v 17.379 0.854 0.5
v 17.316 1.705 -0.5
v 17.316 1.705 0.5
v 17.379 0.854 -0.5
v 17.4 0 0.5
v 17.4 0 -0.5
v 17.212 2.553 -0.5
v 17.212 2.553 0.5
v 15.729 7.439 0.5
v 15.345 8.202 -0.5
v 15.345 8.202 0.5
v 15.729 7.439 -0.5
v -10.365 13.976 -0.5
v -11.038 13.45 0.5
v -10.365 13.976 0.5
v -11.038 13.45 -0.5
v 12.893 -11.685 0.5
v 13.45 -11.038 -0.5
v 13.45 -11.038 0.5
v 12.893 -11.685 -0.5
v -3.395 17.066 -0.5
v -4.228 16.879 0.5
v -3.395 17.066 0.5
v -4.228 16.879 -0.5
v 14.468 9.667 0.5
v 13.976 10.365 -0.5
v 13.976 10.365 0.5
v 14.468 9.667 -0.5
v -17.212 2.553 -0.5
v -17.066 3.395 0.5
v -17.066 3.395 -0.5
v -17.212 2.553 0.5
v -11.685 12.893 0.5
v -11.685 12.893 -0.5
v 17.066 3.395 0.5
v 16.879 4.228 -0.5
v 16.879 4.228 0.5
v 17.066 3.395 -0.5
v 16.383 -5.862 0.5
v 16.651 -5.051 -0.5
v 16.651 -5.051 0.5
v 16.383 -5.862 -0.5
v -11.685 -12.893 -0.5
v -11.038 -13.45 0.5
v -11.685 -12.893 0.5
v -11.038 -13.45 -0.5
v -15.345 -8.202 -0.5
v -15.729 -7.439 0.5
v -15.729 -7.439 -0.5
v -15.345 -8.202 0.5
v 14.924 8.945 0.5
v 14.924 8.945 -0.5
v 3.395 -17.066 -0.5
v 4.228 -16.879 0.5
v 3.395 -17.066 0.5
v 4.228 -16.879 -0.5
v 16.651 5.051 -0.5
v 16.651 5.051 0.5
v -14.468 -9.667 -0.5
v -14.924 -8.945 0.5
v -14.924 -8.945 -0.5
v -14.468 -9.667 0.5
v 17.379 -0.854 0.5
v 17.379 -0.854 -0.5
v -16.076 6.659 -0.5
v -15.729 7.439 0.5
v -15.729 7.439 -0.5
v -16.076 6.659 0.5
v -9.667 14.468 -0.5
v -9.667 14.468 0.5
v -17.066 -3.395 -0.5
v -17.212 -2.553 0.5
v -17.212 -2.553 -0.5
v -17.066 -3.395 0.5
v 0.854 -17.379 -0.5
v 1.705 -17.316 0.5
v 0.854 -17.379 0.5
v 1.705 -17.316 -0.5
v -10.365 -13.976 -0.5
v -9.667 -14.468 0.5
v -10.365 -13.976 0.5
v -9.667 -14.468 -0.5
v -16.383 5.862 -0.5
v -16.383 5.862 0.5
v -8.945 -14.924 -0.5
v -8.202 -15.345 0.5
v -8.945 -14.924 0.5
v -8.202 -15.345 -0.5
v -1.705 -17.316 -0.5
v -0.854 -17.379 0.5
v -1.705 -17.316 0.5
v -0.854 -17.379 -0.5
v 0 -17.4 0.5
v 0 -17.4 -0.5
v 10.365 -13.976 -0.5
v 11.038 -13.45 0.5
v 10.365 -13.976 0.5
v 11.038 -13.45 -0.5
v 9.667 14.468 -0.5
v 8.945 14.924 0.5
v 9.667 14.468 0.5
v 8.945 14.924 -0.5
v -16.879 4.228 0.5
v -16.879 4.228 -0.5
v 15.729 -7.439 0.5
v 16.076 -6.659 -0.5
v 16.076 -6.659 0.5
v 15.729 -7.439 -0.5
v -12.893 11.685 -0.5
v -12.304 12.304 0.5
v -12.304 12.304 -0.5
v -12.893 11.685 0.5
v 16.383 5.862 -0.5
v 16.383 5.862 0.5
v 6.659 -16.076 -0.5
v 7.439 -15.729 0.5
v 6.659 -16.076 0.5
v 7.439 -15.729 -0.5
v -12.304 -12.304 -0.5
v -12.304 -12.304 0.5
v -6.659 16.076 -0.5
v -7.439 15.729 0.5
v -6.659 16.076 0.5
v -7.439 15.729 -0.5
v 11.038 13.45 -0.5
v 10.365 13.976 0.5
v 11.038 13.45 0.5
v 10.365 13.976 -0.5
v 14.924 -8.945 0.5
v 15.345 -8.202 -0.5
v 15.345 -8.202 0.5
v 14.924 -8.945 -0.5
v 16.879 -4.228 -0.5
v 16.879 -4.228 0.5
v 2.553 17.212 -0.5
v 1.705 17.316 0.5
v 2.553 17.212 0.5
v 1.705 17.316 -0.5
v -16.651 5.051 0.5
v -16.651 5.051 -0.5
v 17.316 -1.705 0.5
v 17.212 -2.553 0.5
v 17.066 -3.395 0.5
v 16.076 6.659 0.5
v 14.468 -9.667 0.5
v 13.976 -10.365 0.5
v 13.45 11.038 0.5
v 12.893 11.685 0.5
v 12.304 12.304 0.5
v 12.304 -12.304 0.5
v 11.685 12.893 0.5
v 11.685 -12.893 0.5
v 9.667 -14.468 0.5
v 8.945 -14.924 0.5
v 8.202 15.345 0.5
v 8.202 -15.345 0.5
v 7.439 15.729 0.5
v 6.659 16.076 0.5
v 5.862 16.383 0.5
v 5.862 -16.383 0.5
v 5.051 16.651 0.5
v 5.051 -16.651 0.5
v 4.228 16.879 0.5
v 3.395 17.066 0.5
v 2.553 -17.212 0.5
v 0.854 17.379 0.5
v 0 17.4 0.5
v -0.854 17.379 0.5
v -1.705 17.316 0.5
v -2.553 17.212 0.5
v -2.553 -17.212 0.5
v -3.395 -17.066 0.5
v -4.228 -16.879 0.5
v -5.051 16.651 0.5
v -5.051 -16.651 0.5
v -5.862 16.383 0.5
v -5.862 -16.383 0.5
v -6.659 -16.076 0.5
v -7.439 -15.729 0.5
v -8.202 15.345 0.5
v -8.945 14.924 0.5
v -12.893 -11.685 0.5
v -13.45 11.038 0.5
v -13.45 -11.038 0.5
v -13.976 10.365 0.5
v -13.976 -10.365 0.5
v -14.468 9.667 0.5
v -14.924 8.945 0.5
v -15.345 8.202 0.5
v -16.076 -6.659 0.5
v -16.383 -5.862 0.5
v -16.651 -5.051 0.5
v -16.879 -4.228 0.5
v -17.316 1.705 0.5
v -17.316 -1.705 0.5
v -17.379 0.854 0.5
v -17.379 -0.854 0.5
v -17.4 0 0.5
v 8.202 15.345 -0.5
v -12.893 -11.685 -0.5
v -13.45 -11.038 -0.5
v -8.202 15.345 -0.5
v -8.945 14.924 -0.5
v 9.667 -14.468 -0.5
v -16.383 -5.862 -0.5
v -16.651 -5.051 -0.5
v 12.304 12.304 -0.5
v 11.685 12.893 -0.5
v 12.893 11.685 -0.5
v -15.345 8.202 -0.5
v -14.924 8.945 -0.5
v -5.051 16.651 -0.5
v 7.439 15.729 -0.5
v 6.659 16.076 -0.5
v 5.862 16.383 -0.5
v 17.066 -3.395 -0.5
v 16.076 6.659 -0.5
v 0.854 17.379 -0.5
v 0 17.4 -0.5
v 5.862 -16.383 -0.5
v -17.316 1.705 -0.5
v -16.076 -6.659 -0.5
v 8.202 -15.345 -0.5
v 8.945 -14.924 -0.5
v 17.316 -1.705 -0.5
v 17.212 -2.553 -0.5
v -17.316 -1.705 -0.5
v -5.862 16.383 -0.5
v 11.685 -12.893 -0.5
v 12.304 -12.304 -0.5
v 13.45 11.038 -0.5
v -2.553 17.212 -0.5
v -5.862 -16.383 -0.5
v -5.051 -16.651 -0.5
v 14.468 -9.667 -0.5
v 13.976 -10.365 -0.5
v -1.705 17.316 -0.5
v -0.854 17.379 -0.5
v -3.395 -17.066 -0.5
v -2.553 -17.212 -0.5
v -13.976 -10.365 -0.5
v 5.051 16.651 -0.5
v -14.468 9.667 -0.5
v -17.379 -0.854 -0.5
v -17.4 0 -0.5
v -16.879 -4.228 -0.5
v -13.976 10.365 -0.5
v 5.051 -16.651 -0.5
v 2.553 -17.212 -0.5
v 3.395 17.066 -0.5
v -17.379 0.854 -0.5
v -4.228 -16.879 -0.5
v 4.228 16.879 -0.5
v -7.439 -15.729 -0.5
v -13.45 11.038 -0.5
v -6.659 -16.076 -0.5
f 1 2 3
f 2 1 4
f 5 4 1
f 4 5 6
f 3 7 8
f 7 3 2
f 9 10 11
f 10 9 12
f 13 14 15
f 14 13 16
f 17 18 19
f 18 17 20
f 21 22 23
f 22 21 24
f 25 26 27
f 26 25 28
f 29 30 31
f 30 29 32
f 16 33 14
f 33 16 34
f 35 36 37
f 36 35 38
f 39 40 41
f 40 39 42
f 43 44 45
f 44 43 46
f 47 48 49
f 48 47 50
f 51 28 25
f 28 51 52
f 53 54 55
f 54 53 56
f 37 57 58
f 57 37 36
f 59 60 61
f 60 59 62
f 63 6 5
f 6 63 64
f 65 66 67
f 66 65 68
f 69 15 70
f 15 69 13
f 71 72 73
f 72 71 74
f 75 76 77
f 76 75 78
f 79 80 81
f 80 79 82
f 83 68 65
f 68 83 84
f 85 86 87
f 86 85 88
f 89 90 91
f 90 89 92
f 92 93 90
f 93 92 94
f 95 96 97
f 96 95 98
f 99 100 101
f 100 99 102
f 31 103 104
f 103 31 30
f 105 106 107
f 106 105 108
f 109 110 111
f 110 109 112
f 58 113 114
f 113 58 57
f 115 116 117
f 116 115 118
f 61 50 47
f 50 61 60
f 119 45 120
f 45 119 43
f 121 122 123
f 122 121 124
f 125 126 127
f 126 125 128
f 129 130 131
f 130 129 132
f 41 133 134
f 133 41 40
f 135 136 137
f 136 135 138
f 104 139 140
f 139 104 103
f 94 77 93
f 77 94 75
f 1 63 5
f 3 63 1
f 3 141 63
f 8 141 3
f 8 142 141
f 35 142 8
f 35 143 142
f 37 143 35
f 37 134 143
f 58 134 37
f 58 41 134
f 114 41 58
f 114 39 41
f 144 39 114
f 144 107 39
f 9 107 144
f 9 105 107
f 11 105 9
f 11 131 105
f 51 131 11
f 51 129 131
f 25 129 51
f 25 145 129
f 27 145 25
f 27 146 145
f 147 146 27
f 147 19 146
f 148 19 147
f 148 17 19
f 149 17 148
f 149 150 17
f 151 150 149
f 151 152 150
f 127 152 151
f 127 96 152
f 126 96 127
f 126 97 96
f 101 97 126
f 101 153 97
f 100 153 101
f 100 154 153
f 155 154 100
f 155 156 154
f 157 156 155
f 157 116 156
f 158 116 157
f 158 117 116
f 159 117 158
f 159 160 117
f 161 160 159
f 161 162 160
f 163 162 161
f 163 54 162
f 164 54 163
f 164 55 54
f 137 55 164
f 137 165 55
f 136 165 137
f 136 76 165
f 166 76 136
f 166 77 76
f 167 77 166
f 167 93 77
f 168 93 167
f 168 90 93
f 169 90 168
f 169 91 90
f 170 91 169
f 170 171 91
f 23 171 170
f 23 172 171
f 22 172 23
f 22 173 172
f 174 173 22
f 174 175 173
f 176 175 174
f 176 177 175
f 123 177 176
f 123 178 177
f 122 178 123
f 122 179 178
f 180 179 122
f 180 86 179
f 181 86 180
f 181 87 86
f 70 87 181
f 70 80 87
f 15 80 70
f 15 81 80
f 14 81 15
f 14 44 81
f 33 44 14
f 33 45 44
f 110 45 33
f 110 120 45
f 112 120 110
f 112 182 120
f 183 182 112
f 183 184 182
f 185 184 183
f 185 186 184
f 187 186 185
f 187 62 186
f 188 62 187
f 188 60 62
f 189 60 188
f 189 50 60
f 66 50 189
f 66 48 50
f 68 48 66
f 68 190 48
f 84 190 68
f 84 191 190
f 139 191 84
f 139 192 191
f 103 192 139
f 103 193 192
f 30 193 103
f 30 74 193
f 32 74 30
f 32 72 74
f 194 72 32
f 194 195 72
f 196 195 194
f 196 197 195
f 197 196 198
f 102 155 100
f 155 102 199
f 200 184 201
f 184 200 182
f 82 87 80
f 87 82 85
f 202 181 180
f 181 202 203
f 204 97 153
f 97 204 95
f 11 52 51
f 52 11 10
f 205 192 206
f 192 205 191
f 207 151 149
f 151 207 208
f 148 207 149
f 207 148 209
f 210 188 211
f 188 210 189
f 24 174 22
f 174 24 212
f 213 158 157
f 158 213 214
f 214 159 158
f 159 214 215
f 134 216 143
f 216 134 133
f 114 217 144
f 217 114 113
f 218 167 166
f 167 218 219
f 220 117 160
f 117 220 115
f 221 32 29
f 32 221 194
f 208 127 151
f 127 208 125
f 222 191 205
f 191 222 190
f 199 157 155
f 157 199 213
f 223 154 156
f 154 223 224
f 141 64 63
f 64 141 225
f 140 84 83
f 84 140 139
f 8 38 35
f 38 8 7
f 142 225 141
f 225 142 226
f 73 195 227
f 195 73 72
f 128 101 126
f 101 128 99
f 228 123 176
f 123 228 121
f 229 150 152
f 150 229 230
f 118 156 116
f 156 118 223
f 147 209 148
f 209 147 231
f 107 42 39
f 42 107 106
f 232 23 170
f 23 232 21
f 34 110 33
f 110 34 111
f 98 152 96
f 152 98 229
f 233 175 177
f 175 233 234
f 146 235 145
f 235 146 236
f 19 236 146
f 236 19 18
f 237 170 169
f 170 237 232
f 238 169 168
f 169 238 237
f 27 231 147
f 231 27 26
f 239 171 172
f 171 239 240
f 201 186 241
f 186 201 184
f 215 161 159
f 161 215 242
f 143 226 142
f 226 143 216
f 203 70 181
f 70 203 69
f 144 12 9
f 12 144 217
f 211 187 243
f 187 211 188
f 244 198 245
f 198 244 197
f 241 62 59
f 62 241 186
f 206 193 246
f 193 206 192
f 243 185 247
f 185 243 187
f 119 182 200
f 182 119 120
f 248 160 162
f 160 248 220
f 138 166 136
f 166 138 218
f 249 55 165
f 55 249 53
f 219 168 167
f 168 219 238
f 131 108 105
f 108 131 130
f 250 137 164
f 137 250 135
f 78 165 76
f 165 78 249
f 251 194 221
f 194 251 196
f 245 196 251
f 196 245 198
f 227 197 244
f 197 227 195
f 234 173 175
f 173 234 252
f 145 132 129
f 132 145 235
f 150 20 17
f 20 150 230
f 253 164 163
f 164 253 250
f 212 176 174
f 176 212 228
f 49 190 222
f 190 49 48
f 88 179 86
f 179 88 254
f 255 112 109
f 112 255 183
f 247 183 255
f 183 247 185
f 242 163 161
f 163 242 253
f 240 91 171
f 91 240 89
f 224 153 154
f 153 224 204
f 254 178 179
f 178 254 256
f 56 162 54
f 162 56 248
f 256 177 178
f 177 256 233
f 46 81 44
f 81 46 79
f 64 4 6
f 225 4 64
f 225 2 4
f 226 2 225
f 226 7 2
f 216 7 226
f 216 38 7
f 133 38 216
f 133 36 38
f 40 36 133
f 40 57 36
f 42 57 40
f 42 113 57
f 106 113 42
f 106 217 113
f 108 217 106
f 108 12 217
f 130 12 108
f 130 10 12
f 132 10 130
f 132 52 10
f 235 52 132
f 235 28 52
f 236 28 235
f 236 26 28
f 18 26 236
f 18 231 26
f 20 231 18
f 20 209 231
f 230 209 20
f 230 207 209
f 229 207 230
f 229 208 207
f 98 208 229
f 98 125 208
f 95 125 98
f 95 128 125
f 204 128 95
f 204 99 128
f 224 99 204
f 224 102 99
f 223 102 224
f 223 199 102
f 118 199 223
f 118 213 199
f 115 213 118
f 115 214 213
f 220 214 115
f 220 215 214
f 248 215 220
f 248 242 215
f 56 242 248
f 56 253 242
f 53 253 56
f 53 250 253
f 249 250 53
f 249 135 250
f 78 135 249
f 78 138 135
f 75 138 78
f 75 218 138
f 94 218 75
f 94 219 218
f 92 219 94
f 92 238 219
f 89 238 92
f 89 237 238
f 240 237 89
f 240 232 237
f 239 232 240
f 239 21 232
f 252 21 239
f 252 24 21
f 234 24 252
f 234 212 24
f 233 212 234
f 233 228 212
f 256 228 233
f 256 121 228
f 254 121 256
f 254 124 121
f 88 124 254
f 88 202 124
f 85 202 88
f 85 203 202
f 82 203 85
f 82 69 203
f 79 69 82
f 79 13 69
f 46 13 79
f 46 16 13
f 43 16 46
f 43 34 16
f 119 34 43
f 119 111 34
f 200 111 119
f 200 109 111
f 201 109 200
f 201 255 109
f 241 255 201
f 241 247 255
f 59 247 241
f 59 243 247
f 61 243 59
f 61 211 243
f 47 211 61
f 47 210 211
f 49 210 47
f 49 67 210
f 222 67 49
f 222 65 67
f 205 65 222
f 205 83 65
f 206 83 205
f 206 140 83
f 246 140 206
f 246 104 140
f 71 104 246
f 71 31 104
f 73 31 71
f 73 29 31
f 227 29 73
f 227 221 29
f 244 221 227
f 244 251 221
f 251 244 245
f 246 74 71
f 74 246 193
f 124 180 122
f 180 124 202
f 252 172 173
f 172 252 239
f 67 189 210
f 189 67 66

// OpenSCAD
$fn=128;

radii = [17.4, 11.4, 9, 0.5];

module radial_profile(rs, h=1) {
    union() {
        for (i = [0 : len(rs)-1]) {
            cylinder(h=h, r=rs[i], center=true);
        }
    }
}

radial_profile(radii, h=1);
